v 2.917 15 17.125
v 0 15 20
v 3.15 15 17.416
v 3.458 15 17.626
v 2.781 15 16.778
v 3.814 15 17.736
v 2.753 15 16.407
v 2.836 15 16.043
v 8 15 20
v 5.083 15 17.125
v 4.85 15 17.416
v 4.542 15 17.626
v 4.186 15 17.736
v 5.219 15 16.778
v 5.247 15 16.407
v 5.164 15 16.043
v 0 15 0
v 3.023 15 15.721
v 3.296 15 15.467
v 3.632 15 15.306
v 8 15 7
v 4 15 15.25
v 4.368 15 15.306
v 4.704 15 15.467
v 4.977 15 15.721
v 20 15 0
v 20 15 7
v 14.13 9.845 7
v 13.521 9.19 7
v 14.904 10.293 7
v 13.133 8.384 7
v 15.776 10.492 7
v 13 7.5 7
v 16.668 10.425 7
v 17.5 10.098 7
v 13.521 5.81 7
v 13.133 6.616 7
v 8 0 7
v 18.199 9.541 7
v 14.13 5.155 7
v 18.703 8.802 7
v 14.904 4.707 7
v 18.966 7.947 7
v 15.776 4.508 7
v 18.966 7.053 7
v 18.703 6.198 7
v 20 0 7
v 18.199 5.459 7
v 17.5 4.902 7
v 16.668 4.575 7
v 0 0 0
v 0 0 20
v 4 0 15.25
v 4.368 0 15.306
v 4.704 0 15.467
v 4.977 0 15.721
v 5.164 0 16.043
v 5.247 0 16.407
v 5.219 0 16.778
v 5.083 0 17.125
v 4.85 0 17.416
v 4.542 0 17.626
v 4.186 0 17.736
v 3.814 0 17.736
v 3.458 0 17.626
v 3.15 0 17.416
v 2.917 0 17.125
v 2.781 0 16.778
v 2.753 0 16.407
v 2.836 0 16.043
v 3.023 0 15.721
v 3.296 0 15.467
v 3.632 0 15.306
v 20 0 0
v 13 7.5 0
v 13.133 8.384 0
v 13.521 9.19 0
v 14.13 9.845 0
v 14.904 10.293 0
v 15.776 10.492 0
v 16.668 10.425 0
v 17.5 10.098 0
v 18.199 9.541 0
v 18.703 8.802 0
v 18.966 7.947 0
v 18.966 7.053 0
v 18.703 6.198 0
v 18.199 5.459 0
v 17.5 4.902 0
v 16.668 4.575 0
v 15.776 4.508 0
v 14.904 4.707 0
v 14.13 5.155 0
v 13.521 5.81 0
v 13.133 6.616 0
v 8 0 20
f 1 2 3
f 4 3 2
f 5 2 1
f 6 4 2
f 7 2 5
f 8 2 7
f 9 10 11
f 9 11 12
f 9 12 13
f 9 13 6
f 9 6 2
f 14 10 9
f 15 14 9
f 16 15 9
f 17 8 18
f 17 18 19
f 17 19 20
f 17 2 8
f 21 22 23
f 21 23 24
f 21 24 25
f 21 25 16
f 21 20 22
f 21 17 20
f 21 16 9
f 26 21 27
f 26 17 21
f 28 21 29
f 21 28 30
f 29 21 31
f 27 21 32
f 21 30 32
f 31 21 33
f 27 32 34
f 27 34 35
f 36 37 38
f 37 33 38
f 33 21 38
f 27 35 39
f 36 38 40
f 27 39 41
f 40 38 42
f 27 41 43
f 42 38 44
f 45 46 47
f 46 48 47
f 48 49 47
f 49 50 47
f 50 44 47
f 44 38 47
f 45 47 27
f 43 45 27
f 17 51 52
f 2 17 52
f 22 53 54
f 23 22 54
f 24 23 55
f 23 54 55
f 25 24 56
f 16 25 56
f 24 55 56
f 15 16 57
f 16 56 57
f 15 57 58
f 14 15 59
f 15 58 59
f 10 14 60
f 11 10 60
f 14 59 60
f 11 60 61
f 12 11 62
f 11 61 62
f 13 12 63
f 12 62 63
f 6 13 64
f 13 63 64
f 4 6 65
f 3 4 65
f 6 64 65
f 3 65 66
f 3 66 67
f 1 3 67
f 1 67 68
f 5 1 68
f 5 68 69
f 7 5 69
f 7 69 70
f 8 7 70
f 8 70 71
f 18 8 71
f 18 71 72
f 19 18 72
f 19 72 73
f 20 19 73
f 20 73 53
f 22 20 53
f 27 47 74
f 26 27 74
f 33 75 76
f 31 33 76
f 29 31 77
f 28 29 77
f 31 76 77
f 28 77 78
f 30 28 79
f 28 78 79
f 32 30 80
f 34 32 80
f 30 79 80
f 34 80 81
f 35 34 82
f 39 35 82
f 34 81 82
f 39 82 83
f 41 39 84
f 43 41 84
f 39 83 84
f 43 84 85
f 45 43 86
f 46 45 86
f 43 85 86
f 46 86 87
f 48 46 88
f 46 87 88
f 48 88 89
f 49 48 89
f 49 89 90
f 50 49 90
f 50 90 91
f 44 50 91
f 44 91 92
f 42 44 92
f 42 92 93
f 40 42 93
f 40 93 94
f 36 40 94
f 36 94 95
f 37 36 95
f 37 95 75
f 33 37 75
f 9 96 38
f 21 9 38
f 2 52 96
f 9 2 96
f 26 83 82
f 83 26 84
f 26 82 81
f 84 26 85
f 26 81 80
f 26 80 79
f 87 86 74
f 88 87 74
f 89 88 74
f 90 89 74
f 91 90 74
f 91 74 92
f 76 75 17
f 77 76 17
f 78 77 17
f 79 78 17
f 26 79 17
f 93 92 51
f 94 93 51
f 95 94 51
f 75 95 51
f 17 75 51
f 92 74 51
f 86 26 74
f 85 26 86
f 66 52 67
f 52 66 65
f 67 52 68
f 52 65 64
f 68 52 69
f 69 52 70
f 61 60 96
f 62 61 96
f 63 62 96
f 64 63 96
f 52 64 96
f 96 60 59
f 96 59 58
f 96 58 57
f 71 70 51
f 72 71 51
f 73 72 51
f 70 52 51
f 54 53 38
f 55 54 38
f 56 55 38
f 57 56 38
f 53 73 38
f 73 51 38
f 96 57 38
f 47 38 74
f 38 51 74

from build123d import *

# Parameters (mm, degrees)
ESTRUSIONE_ESTRUSIONE1_DEPTH = 15
SCHIZZO6_R                   = 3
TAGLIO_ESTRUSIONE1_DEPTH     = 10
FORO_FILETTATO_M3_1_D        = 2.5


with BuildPart() as part:
    # Schizzo1 → Estrusione-Estrusione1 (new body)
    with BuildSketch(Plane(origin=(0, 0, 0), x_dir=(1, 0, 0), z_dir=(0, 1, 0))):
        Polygon((8, -7), (20, -7), (20, 0), (0, 0), (0, -20), (8, -20), align=None)
    extrude(amount=ESTRUSIONE_ESTRUSIONE1_DEPTH)

    # Schizzo6 → Taglio-Estrusione1 (cut)
    with BuildSketch(Plane(origin=(0, 0, 0), x_dir=(-1, 0, 0), z_dir=(0, 0, -1))):
        with Locations((-16, 7.5)):
            Circle(SCHIZZO6_R)
    extrude(amount=-TAGLIO_ESTRUSIONE1_DEPTH, mode=Mode.SUBTRACT)

    # Foro filettato M3-1 (through all)
    with Locations(Plane(origin=(4, 15, 16.5), x_dir=(0, 0, 1), z_dir=(0, 1, 0))):
        with Locations((0, 0)):
            Hole(FORO_FILETTATO_M3_1_D / 2)


solid = part.part
